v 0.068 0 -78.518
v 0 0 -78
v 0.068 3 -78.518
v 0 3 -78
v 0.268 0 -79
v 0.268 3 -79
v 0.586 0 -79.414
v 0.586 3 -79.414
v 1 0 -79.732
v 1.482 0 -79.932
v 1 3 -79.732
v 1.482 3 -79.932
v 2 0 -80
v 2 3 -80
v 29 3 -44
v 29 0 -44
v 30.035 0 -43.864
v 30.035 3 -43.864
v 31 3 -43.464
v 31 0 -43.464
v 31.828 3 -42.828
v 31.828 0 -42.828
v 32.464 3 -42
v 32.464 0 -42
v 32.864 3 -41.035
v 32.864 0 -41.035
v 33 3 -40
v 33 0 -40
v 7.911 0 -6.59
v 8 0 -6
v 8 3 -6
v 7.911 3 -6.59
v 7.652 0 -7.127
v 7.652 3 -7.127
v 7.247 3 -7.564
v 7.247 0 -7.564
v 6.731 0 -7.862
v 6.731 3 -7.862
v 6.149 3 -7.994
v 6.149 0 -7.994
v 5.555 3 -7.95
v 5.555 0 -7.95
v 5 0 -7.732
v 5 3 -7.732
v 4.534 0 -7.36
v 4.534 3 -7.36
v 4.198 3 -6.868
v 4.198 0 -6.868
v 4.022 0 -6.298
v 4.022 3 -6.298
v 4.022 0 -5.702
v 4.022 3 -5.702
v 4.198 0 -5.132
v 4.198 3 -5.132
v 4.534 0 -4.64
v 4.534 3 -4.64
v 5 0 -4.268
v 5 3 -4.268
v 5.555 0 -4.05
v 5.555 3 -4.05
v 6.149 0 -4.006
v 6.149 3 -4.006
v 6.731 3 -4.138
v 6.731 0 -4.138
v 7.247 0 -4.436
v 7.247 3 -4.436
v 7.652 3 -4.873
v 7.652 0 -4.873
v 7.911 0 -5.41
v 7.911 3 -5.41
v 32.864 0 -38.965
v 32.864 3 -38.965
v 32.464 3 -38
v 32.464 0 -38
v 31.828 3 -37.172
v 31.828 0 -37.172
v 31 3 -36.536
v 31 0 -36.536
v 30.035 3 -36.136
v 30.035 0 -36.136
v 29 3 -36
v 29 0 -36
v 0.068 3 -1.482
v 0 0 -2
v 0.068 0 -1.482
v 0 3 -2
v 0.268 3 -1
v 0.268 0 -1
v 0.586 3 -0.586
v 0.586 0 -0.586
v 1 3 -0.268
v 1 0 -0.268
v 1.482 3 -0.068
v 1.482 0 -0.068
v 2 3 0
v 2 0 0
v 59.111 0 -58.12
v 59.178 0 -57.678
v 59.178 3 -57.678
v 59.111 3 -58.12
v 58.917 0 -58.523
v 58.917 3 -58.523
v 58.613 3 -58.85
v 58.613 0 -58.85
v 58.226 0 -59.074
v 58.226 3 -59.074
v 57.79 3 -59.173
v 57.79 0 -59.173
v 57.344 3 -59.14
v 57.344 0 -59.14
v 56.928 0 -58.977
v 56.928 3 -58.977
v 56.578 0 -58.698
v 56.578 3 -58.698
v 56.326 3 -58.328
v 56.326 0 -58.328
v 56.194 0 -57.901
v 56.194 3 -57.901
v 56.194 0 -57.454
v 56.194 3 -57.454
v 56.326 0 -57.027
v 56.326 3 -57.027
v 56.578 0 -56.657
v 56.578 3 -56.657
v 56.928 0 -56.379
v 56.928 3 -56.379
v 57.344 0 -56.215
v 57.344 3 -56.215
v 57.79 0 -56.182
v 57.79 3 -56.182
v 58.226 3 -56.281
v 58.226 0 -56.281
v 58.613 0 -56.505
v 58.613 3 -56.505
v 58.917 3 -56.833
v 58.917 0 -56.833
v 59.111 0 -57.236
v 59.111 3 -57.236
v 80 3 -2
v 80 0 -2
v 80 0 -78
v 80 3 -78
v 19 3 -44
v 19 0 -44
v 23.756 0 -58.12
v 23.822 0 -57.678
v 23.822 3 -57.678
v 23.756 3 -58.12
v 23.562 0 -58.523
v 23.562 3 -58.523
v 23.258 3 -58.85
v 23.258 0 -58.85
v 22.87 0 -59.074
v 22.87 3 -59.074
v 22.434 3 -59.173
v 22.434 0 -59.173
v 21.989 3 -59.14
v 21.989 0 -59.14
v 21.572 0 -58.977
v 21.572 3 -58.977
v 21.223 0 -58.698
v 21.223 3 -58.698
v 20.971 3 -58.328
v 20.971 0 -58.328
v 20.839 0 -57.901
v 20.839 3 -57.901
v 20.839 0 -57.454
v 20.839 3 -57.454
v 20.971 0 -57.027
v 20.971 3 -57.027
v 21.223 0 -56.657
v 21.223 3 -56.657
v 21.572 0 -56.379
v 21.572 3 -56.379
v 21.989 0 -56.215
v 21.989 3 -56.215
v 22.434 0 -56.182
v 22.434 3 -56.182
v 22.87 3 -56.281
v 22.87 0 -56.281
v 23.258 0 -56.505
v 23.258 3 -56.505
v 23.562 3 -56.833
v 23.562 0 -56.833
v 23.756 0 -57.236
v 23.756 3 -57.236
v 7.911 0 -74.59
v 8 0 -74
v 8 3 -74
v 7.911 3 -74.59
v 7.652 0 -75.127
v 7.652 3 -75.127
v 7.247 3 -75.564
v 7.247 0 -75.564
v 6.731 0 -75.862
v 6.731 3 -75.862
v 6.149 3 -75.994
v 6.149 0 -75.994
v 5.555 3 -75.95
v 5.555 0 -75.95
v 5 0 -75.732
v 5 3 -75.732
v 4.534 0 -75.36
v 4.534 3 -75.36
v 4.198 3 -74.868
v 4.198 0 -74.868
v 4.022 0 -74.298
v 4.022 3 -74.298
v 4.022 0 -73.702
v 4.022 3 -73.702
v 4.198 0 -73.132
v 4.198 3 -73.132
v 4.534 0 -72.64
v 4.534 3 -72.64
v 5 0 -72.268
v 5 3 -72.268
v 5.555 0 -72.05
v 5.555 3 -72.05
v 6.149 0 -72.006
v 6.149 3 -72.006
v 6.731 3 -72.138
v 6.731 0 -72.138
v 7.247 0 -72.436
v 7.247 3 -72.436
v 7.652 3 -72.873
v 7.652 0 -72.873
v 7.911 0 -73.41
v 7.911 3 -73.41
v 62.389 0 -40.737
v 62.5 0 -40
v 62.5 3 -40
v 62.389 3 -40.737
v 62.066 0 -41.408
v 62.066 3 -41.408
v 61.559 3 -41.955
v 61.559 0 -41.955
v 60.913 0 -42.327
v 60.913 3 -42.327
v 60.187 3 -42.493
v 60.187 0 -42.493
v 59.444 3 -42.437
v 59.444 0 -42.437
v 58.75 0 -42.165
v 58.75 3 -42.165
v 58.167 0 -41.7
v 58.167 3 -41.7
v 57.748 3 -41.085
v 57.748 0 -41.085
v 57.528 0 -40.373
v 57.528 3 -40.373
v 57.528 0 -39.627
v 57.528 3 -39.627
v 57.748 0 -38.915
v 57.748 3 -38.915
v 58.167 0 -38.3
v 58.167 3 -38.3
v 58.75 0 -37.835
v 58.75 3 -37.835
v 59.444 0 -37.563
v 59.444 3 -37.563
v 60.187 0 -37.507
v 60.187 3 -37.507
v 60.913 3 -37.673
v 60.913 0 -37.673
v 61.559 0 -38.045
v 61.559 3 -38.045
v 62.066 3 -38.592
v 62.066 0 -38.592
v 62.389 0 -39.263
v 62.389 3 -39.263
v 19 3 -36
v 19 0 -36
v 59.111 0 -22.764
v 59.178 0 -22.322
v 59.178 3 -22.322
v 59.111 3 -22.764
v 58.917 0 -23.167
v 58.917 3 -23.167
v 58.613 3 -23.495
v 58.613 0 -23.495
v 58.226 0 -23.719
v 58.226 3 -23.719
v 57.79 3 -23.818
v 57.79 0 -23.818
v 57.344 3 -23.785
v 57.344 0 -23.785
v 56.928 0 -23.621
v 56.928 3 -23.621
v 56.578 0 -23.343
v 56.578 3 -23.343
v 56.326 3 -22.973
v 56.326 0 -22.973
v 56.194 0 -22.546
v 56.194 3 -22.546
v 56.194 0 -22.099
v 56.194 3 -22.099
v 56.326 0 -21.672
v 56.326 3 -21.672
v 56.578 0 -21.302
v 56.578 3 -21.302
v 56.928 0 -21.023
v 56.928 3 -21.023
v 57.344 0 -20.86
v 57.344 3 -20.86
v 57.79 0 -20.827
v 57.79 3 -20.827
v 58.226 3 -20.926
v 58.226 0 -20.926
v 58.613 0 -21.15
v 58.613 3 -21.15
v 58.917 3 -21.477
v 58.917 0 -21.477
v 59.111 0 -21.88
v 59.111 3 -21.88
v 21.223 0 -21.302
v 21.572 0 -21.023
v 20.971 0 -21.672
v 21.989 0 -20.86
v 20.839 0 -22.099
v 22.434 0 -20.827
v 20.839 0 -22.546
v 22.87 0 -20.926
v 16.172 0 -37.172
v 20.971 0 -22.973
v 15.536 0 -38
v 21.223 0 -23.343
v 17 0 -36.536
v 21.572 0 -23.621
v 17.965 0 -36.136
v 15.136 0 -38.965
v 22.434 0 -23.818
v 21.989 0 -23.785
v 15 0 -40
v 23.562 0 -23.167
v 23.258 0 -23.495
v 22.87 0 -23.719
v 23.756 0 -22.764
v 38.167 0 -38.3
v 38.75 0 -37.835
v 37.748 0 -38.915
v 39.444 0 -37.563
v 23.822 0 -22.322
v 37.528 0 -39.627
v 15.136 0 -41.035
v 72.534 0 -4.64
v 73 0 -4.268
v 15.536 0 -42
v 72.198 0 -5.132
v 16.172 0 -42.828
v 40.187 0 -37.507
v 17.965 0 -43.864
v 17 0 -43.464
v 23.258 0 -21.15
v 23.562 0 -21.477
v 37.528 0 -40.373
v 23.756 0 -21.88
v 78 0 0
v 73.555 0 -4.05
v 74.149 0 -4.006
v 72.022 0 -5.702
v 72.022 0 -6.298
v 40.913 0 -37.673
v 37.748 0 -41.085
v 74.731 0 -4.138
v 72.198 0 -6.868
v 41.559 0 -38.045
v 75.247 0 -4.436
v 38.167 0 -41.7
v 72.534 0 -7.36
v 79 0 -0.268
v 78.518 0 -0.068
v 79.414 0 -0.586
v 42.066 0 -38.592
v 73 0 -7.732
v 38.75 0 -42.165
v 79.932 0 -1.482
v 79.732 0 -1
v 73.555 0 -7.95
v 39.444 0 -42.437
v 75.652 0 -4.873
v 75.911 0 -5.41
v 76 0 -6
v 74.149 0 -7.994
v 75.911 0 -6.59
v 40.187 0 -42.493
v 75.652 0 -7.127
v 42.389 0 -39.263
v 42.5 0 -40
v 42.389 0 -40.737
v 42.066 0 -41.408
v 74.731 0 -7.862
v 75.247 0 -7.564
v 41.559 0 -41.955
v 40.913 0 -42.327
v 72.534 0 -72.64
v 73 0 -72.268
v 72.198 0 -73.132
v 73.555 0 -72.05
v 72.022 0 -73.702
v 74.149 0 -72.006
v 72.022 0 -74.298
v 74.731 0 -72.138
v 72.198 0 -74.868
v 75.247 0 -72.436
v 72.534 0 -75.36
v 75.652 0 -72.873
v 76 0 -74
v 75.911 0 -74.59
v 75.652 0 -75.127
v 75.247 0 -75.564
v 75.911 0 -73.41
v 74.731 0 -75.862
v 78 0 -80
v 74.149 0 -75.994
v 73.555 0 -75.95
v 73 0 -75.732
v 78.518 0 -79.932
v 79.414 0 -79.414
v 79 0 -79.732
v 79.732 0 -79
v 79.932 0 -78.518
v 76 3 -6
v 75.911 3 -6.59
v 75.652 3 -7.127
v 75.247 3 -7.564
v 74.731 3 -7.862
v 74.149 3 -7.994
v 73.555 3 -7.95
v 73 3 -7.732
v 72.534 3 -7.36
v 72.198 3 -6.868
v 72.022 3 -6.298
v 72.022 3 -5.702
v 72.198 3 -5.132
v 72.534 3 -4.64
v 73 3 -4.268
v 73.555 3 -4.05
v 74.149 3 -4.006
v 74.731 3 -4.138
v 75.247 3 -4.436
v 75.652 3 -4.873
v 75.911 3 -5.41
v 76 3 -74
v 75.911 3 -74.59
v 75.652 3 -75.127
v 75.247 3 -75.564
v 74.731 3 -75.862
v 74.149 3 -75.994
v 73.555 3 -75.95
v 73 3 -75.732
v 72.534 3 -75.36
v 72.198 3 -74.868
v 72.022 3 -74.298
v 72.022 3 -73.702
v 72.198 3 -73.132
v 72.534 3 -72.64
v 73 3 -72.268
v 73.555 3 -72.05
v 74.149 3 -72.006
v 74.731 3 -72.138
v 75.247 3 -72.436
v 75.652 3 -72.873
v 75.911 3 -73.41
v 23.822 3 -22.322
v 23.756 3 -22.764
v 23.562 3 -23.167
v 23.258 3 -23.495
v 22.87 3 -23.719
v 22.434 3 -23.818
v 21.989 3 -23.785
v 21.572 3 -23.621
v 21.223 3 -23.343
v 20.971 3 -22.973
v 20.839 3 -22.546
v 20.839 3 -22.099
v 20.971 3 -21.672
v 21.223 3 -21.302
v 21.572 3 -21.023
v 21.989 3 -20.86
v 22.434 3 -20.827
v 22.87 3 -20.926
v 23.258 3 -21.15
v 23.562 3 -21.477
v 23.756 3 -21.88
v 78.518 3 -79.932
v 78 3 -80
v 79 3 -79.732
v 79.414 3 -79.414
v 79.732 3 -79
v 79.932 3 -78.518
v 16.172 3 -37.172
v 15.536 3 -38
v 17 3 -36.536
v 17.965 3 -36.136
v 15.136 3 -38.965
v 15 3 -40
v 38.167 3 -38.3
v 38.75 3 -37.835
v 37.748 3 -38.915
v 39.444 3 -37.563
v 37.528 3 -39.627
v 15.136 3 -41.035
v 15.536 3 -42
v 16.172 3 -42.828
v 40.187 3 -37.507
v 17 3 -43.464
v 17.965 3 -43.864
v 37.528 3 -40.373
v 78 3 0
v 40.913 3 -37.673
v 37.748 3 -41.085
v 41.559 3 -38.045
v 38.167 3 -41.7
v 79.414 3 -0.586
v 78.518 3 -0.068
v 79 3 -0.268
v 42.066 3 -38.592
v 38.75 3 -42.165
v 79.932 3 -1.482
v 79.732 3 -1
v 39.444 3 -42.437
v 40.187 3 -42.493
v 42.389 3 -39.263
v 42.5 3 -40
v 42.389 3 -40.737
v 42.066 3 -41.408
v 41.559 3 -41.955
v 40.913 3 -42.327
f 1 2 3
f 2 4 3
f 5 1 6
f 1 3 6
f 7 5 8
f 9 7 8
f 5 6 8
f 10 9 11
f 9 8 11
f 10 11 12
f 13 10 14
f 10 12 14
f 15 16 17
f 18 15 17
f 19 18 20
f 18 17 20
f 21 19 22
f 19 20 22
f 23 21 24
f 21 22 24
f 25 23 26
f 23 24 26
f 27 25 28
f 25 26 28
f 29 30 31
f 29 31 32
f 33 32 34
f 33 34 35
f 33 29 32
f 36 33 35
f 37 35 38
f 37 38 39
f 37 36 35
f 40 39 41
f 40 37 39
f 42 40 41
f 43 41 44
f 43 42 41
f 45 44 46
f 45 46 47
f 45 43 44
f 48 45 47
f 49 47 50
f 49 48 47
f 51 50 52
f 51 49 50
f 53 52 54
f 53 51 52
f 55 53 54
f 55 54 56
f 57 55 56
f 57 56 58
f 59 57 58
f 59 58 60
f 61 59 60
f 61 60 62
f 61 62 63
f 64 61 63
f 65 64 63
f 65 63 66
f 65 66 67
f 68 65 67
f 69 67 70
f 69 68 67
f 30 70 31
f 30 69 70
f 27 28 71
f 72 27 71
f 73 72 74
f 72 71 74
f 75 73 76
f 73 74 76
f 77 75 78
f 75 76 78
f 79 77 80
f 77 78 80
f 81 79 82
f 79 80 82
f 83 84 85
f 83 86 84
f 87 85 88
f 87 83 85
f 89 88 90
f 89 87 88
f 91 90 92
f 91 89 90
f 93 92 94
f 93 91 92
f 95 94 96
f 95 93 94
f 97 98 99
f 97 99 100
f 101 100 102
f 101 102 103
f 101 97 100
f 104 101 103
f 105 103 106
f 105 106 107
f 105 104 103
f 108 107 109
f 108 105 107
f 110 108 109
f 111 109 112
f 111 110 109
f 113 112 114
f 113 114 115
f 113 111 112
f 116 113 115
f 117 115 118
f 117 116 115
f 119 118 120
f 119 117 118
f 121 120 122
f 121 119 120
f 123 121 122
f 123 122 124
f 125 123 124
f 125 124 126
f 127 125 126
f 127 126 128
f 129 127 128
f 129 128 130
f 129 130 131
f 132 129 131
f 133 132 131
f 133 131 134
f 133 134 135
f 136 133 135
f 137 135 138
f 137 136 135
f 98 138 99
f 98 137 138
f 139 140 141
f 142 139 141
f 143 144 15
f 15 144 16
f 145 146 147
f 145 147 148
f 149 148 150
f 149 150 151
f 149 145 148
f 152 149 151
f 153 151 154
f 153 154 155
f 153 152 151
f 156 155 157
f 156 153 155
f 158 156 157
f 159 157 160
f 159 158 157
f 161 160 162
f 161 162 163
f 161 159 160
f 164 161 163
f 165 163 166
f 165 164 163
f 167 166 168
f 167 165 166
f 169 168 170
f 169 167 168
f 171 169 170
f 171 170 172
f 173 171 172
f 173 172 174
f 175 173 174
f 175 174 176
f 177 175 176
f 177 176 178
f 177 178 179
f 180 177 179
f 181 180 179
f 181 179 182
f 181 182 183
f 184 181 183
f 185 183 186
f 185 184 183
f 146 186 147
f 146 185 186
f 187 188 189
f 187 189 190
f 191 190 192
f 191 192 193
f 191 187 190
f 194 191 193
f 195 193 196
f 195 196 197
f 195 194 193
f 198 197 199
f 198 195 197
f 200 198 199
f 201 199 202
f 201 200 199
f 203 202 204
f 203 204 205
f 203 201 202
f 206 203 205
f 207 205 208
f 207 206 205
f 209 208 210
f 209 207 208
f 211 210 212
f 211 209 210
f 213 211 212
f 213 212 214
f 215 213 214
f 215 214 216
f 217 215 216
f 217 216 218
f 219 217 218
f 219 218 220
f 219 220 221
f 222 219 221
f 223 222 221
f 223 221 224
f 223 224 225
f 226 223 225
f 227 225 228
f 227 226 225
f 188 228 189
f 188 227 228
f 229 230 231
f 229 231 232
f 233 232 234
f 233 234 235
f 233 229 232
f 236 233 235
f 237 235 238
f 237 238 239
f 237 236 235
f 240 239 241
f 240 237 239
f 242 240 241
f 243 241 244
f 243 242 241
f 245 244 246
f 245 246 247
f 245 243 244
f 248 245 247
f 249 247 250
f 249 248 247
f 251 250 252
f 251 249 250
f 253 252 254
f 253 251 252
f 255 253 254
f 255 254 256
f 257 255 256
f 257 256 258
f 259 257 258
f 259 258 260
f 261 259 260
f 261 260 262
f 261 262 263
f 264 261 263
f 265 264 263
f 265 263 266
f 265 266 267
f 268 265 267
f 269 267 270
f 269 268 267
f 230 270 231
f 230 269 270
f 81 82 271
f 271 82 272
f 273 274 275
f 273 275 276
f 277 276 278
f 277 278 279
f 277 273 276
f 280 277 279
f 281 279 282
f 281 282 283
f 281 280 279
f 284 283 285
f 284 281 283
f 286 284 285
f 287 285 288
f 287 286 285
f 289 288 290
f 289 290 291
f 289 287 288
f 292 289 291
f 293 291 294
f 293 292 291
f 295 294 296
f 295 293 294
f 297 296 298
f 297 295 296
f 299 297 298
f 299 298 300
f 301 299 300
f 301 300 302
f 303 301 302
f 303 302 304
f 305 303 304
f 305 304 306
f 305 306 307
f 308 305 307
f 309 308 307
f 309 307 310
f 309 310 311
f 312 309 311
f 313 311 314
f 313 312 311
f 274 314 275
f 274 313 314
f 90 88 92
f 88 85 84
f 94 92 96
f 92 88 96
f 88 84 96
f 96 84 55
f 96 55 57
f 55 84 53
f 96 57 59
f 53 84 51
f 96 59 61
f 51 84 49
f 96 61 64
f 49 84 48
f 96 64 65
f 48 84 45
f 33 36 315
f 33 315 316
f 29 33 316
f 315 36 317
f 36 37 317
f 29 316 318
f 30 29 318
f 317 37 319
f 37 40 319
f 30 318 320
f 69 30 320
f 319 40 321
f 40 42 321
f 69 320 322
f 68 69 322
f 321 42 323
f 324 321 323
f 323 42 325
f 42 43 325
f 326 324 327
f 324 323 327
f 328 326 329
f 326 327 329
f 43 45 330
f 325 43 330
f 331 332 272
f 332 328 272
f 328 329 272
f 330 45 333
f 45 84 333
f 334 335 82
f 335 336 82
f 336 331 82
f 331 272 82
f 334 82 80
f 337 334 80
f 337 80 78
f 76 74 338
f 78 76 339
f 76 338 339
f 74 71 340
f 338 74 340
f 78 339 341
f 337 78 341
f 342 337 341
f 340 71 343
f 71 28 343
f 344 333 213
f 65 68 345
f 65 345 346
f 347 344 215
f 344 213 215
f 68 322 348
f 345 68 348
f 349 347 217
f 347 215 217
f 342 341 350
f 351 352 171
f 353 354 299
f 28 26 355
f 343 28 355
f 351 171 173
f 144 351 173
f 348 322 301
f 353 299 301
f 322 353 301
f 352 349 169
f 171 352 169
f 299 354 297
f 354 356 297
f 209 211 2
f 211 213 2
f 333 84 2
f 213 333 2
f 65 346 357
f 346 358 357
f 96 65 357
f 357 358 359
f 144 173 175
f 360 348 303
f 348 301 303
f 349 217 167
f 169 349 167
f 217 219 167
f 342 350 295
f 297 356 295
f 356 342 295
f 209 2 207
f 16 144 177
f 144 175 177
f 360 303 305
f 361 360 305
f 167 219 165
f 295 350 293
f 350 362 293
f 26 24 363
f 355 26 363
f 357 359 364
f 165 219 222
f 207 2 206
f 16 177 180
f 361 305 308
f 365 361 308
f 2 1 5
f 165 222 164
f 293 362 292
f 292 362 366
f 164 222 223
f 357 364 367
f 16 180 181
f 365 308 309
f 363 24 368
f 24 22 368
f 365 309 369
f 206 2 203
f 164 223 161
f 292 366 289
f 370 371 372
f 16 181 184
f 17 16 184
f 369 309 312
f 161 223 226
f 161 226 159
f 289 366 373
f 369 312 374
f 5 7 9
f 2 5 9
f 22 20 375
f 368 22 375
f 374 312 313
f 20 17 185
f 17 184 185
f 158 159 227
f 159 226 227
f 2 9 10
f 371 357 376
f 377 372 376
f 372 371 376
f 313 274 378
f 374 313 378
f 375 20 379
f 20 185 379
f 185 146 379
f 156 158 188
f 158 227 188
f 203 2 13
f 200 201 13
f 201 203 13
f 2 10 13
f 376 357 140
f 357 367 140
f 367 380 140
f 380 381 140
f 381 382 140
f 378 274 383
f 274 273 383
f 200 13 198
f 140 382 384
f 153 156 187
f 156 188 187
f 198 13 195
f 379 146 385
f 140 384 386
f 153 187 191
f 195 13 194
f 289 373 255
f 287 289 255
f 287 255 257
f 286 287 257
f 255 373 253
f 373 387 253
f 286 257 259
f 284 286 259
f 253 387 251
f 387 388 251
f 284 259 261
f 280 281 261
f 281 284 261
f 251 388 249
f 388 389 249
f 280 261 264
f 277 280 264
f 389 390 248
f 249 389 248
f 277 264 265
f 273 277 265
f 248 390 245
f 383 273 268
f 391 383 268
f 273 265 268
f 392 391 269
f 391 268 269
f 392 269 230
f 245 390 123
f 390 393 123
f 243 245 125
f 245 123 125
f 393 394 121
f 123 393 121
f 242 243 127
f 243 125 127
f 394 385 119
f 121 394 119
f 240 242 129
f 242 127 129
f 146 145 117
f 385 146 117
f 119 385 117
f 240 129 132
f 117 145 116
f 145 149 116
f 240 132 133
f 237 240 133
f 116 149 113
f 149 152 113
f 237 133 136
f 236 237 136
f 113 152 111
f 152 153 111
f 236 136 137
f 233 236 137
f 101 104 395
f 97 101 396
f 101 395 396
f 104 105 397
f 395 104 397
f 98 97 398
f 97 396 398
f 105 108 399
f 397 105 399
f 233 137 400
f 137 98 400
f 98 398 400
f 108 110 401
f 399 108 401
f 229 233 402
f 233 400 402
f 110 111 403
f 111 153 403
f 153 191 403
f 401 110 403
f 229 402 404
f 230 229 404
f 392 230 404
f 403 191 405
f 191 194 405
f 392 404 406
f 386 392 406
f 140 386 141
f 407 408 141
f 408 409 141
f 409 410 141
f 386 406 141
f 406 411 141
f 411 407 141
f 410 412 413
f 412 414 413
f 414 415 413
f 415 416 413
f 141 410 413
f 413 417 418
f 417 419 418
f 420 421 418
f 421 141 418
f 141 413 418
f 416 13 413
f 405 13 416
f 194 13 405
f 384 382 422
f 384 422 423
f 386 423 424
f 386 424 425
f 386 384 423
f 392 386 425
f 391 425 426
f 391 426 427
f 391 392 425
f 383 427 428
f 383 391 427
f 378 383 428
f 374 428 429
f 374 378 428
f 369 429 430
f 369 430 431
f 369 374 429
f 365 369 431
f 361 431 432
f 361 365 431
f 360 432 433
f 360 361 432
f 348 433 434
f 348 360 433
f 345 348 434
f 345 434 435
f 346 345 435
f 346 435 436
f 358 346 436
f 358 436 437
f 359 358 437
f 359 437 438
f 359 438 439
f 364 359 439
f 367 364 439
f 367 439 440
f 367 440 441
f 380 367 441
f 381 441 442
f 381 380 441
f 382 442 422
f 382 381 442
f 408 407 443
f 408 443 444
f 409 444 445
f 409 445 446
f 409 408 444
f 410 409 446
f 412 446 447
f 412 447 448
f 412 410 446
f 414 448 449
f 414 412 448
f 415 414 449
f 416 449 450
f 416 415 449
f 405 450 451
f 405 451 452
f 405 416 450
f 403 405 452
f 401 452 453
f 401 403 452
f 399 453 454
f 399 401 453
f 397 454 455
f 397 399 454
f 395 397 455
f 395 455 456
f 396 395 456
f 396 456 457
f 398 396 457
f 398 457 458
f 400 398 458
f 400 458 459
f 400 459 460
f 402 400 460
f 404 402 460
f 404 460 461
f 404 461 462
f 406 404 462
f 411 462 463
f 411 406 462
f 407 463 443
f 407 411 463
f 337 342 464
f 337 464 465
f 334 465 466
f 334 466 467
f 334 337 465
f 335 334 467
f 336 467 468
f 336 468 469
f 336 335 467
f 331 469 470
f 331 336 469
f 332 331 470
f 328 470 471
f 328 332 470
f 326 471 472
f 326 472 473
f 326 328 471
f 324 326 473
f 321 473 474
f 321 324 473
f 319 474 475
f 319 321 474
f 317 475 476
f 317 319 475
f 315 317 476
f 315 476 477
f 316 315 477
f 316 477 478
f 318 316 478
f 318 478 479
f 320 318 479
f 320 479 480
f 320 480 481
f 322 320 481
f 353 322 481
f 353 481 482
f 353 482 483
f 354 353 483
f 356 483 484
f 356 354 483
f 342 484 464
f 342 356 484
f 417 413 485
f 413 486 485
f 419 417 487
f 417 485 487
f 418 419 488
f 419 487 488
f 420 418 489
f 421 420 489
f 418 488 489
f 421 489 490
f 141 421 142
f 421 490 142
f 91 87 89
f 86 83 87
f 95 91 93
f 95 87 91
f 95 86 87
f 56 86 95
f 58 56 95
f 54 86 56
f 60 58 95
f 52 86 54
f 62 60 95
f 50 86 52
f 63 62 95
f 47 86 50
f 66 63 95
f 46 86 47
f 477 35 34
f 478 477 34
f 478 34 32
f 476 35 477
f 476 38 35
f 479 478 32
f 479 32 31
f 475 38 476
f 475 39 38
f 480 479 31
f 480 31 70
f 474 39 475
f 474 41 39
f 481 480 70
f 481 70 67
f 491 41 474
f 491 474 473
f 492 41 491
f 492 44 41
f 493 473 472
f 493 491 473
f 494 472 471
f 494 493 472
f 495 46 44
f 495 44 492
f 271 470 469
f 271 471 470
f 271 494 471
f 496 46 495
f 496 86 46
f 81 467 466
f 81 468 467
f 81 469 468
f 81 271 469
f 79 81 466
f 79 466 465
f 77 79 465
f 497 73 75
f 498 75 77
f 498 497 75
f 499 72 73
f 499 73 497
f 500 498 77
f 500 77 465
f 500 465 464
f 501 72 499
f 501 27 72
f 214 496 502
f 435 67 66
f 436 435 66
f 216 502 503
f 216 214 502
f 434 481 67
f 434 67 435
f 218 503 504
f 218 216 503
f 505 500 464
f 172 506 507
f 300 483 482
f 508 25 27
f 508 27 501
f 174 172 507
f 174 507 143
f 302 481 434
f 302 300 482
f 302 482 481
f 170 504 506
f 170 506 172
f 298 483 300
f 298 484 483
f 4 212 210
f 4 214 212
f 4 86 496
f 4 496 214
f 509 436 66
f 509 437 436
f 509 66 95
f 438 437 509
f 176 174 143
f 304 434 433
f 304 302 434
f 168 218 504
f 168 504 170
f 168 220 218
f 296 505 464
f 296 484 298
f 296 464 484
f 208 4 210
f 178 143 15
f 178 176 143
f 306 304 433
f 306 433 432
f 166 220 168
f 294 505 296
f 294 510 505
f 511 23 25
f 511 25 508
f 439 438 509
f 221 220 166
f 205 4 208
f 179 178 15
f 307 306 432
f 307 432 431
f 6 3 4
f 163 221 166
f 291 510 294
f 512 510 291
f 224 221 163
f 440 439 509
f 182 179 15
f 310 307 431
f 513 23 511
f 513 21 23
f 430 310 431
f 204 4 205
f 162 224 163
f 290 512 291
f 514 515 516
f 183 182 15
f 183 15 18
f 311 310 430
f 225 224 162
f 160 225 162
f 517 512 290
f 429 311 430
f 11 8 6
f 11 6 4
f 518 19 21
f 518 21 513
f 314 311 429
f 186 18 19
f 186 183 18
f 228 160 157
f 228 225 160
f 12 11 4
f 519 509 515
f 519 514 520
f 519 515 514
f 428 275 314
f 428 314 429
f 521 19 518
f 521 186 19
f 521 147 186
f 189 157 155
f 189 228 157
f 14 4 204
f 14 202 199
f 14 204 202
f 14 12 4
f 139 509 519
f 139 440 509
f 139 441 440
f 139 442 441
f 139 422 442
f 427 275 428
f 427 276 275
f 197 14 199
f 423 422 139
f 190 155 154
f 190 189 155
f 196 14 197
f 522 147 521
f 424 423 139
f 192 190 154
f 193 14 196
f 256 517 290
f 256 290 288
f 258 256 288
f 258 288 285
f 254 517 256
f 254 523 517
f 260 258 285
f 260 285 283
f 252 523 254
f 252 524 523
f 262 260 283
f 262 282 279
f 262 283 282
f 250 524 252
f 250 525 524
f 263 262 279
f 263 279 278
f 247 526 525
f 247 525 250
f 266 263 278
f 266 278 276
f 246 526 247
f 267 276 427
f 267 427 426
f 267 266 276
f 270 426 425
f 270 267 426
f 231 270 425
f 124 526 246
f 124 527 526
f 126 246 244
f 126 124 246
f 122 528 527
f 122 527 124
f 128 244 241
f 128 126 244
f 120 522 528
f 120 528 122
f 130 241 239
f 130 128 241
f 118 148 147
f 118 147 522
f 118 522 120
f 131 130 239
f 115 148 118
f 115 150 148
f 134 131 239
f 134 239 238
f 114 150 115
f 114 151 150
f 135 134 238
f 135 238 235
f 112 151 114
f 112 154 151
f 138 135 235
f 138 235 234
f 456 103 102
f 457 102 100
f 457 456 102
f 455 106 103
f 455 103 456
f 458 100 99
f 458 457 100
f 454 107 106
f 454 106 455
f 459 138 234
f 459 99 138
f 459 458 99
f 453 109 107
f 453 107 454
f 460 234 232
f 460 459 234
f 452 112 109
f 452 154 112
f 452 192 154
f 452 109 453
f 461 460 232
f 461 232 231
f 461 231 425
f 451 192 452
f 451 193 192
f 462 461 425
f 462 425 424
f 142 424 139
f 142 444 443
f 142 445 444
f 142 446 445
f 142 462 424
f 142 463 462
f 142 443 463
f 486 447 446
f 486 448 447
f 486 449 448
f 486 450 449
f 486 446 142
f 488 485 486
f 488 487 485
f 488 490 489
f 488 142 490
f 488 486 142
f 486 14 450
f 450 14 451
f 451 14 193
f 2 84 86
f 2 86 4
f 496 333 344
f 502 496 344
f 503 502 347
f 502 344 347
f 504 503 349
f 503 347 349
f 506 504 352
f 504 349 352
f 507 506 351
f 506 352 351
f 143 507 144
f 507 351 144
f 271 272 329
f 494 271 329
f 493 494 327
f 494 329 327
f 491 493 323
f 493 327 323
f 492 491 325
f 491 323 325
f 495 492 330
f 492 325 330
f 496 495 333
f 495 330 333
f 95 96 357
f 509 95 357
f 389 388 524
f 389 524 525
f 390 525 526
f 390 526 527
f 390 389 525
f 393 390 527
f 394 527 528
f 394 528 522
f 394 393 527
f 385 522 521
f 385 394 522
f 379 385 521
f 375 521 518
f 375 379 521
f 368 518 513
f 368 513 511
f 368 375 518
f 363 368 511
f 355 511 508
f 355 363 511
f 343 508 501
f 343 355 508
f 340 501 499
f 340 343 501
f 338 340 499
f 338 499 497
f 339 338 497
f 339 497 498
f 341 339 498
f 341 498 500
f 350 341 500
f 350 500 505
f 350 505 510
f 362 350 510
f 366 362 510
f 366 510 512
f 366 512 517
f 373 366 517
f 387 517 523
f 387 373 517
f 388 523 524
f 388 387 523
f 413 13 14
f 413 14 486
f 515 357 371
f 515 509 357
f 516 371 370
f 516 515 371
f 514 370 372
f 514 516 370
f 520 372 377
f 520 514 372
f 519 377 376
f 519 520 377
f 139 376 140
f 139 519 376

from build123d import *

# Parameters (mm, degrees)
ESQUISSE1_W      = 80
ESQUISSE1_H      = 80
ESQUISSE1_R      = 2.5
ESQUISSE1_R_2    = 1.5
ESQUISSE1_R_3    = 2
EXTRUSION1_DEPTH = 3
CONG_1_R         = 2


with BuildPart() as part:
    # Esquisse1 → Extrusion1 (new body)
    with BuildSketch(Plane(origin=(0, 0, 0), x_dir=(1, 0, 0), z_dir=(0, 1, 0))):
        with Locations((40, 40)):
            Rectangle(ESQUISSE1_W, ESQUISSE1_H)
        with Locations((40, 40)):
            Circle(ESQUISSE1_R, mode=Mode.SUBTRACT)
        with Locations((60, 40)):
            Circle(ESQUISSE1_R, mode=Mode.SUBTRACT)
        with Locations((57.67766953, 57.67766953)):
            Circle(ESQUISSE1_R_2, mode=Mode.SUBTRACT)
        with Locations((22.32233047, 22.32233047)):
            Circle(ESQUISSE1_R_2, mode=Mode.SUBTRACT)
        with Locations((22.32233047, 57.67766953)):
            Circle(ESQUISSE1_R_2, mode=Mode.SUBTRACT)
        with Locations((57.67766953, 22.32233047)):
            Circle(ESQUISSE1_R_2, mode=Mode.SUBTRACT)
        with Locations((6, 74)):
            Circle(ESQUISSE1_R_3, mode=Mode.SUBTRACT)
        with Locations((74, 74)):
            Circle(ESQUISSE1_R_3, mode=Mode.SUBTRACT)
        with Locations((74, 6)):
            Circle(ESQUISSE1_R_3, mode=Mode.SUBTRACT)
        with Locations((6, 6)):
            Circle(ESQUISSE1_R_3, mode=Mode.SUBTRACT)
        with BuildLine():
            Line((19, 44), (29, 44))
            ThreePointArc((29, 44), (31.828427125, 42.828427125), (33, 40))
            ThreePointArc((33, 40), (31.828427125, 37.171572875), (29, 36))
            Line((29, 36), (19, 36))
            ThreePointArc((19, 36), (16.171572875, 37.171572875), (15, 40))
            ThreePointArc((15, 40), (16.171572875, 42.828427125), (19, 44))
        make_face(mode=Mode.SUBTRACT)
    extrude(amount=EXTRUSION1_DEPTH)

    # Congé1
    cong_1_edges = [part.edges().sort_by_distance(p)[0] for p in [
        (0, 1.5, -80),
        (80, 1.5, -80),
        (80, 1.5, 0),
        (0, 1.5, 0),
    ]]
    fillet(cong_1_edges, radius=CONG_1_R)


solid = part.part
